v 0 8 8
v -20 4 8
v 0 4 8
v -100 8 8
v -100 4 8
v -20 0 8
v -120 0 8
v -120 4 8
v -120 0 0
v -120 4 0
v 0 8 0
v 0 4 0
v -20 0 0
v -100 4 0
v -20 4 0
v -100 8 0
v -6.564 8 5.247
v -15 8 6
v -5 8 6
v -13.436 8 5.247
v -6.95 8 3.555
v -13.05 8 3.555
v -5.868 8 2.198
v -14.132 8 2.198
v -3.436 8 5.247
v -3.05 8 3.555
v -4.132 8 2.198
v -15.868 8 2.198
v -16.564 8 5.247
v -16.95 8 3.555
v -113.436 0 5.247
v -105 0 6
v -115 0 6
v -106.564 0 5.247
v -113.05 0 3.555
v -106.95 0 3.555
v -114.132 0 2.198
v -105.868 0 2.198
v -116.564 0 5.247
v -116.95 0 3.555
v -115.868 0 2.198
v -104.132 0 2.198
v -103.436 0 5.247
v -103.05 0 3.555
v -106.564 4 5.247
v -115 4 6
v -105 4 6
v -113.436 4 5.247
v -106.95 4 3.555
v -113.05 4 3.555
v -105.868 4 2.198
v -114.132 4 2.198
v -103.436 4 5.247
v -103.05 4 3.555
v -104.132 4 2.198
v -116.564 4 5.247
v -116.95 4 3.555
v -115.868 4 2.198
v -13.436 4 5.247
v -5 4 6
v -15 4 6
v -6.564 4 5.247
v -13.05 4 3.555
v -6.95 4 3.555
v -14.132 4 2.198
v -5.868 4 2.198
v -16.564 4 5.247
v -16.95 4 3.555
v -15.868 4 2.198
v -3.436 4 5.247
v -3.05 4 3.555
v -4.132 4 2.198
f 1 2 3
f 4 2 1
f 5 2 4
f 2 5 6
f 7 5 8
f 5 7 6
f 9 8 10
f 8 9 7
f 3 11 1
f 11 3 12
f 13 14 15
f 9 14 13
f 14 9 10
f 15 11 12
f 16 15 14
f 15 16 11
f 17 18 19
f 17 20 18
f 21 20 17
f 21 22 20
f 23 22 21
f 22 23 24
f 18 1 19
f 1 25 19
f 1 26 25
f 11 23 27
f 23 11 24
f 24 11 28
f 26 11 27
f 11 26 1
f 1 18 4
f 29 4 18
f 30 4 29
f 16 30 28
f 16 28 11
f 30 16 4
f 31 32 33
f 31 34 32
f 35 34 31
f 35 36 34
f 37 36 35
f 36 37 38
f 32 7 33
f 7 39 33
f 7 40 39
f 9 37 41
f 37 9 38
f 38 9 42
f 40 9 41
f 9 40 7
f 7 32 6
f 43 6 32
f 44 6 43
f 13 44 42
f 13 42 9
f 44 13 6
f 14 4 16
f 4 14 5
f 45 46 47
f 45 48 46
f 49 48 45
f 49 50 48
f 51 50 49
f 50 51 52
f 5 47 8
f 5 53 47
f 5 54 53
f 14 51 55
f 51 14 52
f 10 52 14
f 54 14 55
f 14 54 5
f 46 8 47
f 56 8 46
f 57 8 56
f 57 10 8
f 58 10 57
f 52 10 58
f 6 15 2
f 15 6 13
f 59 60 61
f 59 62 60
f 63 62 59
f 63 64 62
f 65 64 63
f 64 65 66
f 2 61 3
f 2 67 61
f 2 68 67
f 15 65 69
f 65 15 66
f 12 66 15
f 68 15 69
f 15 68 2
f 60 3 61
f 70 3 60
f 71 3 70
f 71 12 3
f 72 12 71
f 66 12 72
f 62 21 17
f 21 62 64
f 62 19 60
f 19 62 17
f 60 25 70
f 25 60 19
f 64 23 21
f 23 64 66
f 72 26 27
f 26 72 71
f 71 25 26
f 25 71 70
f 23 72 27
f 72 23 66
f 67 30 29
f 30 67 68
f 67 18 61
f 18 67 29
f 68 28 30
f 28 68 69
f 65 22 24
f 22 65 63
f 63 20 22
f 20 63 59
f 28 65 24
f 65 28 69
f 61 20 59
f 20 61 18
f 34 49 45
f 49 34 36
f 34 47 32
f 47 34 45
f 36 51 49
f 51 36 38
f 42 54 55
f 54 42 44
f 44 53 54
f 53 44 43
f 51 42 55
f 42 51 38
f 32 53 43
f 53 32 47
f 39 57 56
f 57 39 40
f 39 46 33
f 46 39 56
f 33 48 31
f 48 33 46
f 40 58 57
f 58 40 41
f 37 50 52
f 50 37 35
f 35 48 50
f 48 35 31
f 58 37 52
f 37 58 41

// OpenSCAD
SupportAxisHeight           = 140                        ;
SupportWidth                = 200                       ;
AxisRadius                  = 5.5                       ;


AxisSupportThickness        = 8                        ;
AxisSupportWidth            = 8                         ;

cubeSupportLenght           = 80                        ;
cubeSupportScrewPartLength  = 20                        ;
ScrewRadius                 = 2                         ;

A                           = acos(SupportAxisHeight/sqrt((SupportWidth/2)*(SupportWidth/2)+SupportAxisHeight*SupportAxisHeight))   ;
Hypotenuse                  = SupportAxisHeight/cos(A)                                                                              ;
T                           = AxisSupportThickness                                                                                  ;
O                           = ((T/(2*cos(90-A)))-(T/2))*sin(A)                                                                      ;
D                           = (cubeSupportLenght+AxisRadius-cubeSupportScrewPartLength)*cos(A)-O                                    ;
H                           = D/cos(A)                                                                                              ;
L                           = D*tan(A)                                                                                              ;

NodeLenght                  = 15    ;

LengthStrengh               = L*2;
TranslateXStrengh           = D * cos(90 - A);
TranslateYStrengh           = D * cos(A);

FootHeight                  = 15;

A2                          = atan((SupportAxisHeight-D-NodeLenght+AxisSupportThickness/2)/(SupportWidth/2));
BoltThickness               = 100;                        ;
ConnectionLength            = BoltThickness/2+cubeSupportScrewPartLength/2  ;

// $fn                     = 300   ;
// echo("ConnectionLength",ConnectionLength);

module Base1()
{
    difference()
    {
        // axis support fixation structure 1
        translate([(cubeSupportLenght+AxisRadius-cubeSupportScrewPartLength)*cos(-A)-AxisSupportThickness/2*sin(A) , (cubeSupportLenght+AxisRadius-cubeSupportScrewPartLength)*sin(-A)-AxisSupportThickness/2*cos(A) , 0])
        {
            rotate([0 , 0 , -A])
            {
               cube([ Hypotenuse-cubeSupportLenght+cubeSupportScrewPartLength-AxisRadius+10*AxisSupportThickness*cos(A), AxisSupportThickness , AxisSupportWidth]);
            }
        }
        // screw part removal
        translate([(cubeSupportLenght+AxisRadius-cubeSupportScrewPartLength)*cos(-A)-AxisSupportThickness/2*sin(A) , (cubeSupportLenght+AxisRadius-cubeSupportScrewPartLength)*sin(-A)-AxisSupportThickness/2*cos(A), -0.5])   // Screw fixation hole part 1
        {
            rotate([0 , 0 , -A])
            {
                cube([cubeSupportScrewPartLength , AxisSupportThickness/2 , AxisSupportWidth+10]);
            }
        }
        //screw holes
        translate([(cubeSupportLenght+AxisRadius-3/4*cubeSupportScrewPartLength)*cos(-A) , (cubeSupportLenght+AxisRadius-3/4*cubeSupportScrewPartLength)*sin(-A), AxisSupportWidth/2])  // screw hole 1 support 1
        {
            rotate([90 , 0 , -A])
            {
                cylinder(h = AxisSupportThickness+50 , r = ScrewRadius , center = true);
            }
        }
        translate([(cubeSupportLenght+AxisRadius-1/4*cubeSupportScrewPartLength)*cos(-A) , (cubeSupportLenght+AxisRadius-1/4*cubeSupportScrewPartLength)*sin(-A), AxisSupportWidth/2])  // screw hole 2 support 1
        {
            rotate([90 , 0 , -A])
            {
                cylinder(h = AxisSupportThickness+50 , r = ScrewRadius , center = true);
            }
        }
        // plane foot removal
        translate([SupportAxisHeight , -SupportWidth*2 , -0.5])
        {
            cube([ SupportAxisHeight , SupportWidth*2, AxisSupportWidth+1]);
        }
    }
    difference()
    {
        // horizontal base part
        translate([SupportAxisHeight-FootHeight-AxisSupportThickness , -((SupportAxisHeight-FootHeight)*tan(A))+AxisSupportThickness/2/cos(A), 0]) // horizontal strength structure between axis support
        {
            cube([ AxisSupportThickness , (SupportAxisHeight-FootHeight)*tan(A)+cubeSupportScrewPartLength/2-AxisSupportThickness/2/cos(A), AxisSupportWidth]);
        }
        // screw part removal
        translate([SupportAxisHeight-FootHeight-AxisSupportThickness , 0 , AxisSupportWidth/2]) // screw part
        {
            cube([ AxisSupportThickness , cubeSupportScrewPartLength, AxisSupportWidth+1] , center = true);
        }
        //screw holes
        translate([SupportAxisHeight-FootHeight-AxisSupportThickness , -1/4*cubeSupportScrewPartLength, AxisSupportWidth/2])  // screw hole 2 support 1
        {
            rotate([0 , 90 , 0])
            {
                cylinder(h = AxisSupportThickness+50 , r = ScrewRadius , center = true);
            }
        }
        translate([SupportAxisHeight-FootHeight-AxisSupportThickness , 1/4*cubeSupportScrewPartLength, AxisSupportWidth/2])  // screw hole 2 support 1
        {
            rotate([0 , 90 , 0])
            {
                cylinder(h = AxisSupportThickness+50 , r = ScrewRadius , center = true);
            }
        }
    }
    //oblic strenght structure
    difference()
    {
        translate([Hypotenuse*cos(-A)-AxisSupportThickness/2*sin(A) , Hypotenuse*sin(-A)-AxisSupportThickness/2*cos(A), ])
        {
            rotate([0 , 0 , A2])
            {
                cube([ AxisSupportThickness , (AxisSupportThickness/2 + SupportWidth/2)/cos(A2), AxisSupportWidth]);
            }
        }
        // plane foot removal
        translate([SupportAxisHeight , -SupportWidth*2 , -0.5])
        {
            cube([ SupportAxisHeight , SupportWidth*2, AxisSupportWidth+1]);
        }
        // screw hole
        translate([D+NodeLenght-AxisSupportThickness/2 , 0 , 0])
        {
            {
                cylinder(h = AxisSupportThickness+50 , r = ScrewRadius , center = true);
            }
        }
        //assembly thickness removal
        translate([D+AxisSupportThickness/2 , -AxisSupportThickness/2 , AxisSupportWidth*2/3-AxisSupportWidth])
        {
            {
                cube([NodeLenght+1 , AxisSupportThickness+10 , AxisSupportWidth]);
            }
        }
        //removal of the conflicting part with the second base
        translate([D+AxisSupportThickness/2 , -AxisSupportThickness/2+AxisSupportThickness , 0])
        {
            {
                cube([NodeLenght+1 , AxisSupportThickness+10 , AxisSupportWidth]);
            }
        }
        //removal of the conflicting part with axis structure
        translate([AxisSupportThickness/2+0.5  ,-(AxisSupportThickness*10)/2 , -0.5])
        {
            {
                cube([D , AxisSupportThickness*10 , AxisSupportWidth+1]);
            }
        }
    }
    
    difference()
    {
        //assembly part to connect 2 strutures
        translate([SupportAxisHeight-FootHeight-AxisSupportThickness , -((SupportAxisHeight-FootHeight)*tan(A))+AxisSupportThickness/2/cos(A), 0]) // horizontal strength structure between axis support
        {
            // color("red")cube([ AxisSupportThickness , AxisSupportWidth ,ConnectionLength+AxisSupportWidth]);
            cube([ AxisSupportThickness , AxisSupportWidth ,ConnectionLength+AxisSupportWidth]);
        }
        translate([SupportAxisHeight-FootHeight-AxisSupportThickness , -((SupportAxisHeight-FootHeight)*tan(A))+AxisSupportThickness/2/cos(A), ConnectionLength+AxisSupportWidth-cubeSupportScrewPartLength]) // horizontal strength structure between axis support
        {
            cube([ AxisSupportThickness , AxisSupportWidth/2 , cubeSupportScrewPartLength]);
        }
        translate([SupportAxisHeight-FootHeight-AxisSupportThickness/2 , -((SupportAxisHeight-FootHeight)*tan(A))+AxisSupportThickness/2/cos(A), ConnectionLength+AxisSupportWidth-3/4*cubeSupportScrewPartLength]) // horizontal strength structure between axis support
        {
            rotate([90 , 0 , 0])
            {
                cylinder(h = AxisSupportThickness+50 , r = ScrewRadius , center = true);
            }
        }
        translate([SupportAxisHeight-FootHeight-AxisSupportThickness/2 , -((SupportAxisHeight-FootHeight)*tan(A))+AxisSupportThickness/2/cos(A), ConnectionLength+AxisSupportWidth-1/4*cubeSupportScrewPartLength]) // horizontal strength structure between axis support
        {
            rotate([90 , 0 , 0])
            {
                cylinder(h = AxisSupportThickness+50 , r = ScrewRadius , center = true);
            }
        }
    }
}
    
    
    
    
    

module Base2()
{
    difference()
    {
        // axis support fixation structure 1
        translate([(cubeSupportLenght+AxisRadius-cubeSupportScrewPartLength)*cos(A)-AxisSupportThickness/2*sin(-A) , (cubeSupportLenght+AxisRadius-cubeSupportScrewPartLength)*sin(A)-AxisSupportThickness/2*cos(-A) , 0])
        {
            rotate([0 , 0 , A])
            {
               cube([ Hypotenuse-cubeSupportLenght+cubeSupportScrewPartLength-AxisRadius+10*AxisSupportThickness*cos(A), AxisSupportThickness , AxisSupportWidth]);
            }
        }
        // screw part removal
        translate([(cubeSupportLenght+AxisRadius-cubeSupportScrewPartLength)*cos(A) , (cubeSupportLenght+AxisRadius-cubeSupportScrewPartLength)*sin(A), -0.5])
        {
            rotate([0 , 0 , A])
            {
                cube([cubeSupportScrewPartLength , AxisSupportThickness/2 , AxisSupportWidth+1]);
            }
        }
        //screw holes
        translate([(cubeSupportLenght+AxisRadius-3/4*cubeSupportScrewPartLength)*cos(A) , (cubeSupportLenght+AxisRadius-3/4*cubeSupportScrewPartLength)*sin(A), AxisSupportWidth/2])
        {
            rotate([90 , 0 , A])
            {
                cylinder(h = AxisSupportThickness+50 , r = ScrewRadius , center = true);
            }
        }
        translate([(cubeSupportLenght+AxisRadius-1/4*cubeSupportScrewPartLength)*cos(A) , (cubeSupportLenght+AxisRadius-1/4*cubeSupportScrewPartLength)*sin(A), AxisSupportWidth/2])
        {
            rotate([90 , 0 , A])
            {
                cylinder(h = AxisSupportThickness+50 , r = ScrewRadius , center = true);
            }
        }
        // plane foot removal
        translate([SupportAxisHeight , 0 , -0.5])
        {
            cube([ SupportAxisHeight , SupportWidth*2, AxisSupportWidth+1]);
        }
    }
    difference()
    {
        // horizontal base part
        translate([SupportAxisHeight-FootHeight-AxisSupportThickness , -cubeSupportScrewPartLength/2, 0])
        {
            cube([ AxisSupportThickness , (SupportAxisHeight-FootHeight)*tan(A)+cubeSupportScrewPartLength/2-AxisSupportThickness/2/cos(A), AxisSupportWidth]);
        }
        // screw part removal
        translate([SupportAxisHeight-FootHeight , 0 , AxisSupportWidth/2])
        {
            cube([ AxisSupportThickness , cubeSupportScrewPartLength, AxisSupportWidth+1] , center = true);
        }
        //screw holes
        translate([SupportAxisHeight-FootHeight-AxisSupportThickness , -1/4*cubeSupportScrewPartLength, AxisSupportWidth/2])
        {
            rotate([0 , 90 , 0])
            {
                cylinder(h = AxisSupportThickness+50 , r = ScrewRadius , center = true);
            }
        }
        translate([SupportAxisHeight-FootHeight-AxisSupportThickness , 1/4*cubeSupportScrewPartLength, AxisSupportWidth/2])
        {
            rotate([0 , 90 , 0])
            {
                cylinder(h = AxisSupportThickness+50 , r = ScrewRadius , center = true);
            }
        }
    }
    
    difference()
    {
        mirror([0 , 1 , 0])
        {
            difference()
            {
                //oblic strenght structure//removal of the conflicting part with axis structure
                translate([Hypotenuse*cos(-A)-AxisSupportThickness/2*sin(A) , Hypotenuse*sin(-A)-AxisSupportThickness/2*cos(A), ])
                {
                    rotate([0 , 0 , A2])
                    {
                        cube([ AxisSupportThickness , (AxisSupportThickness/2 + SupportWidth/2)/cos(A2), AxisSupportWidth]);
                    }
                }
                // plane foot removal
                translate([SupportAxisHeight , -SupportWidth*2 , -0.5])
                {
                    cube([ SupportAxisHeight , SupportWidth*2, AxisSupportWidth+1]);
                }
                //assembly thickness removal
                translate([D+AxisSupportThickness/2 , -AxisSupportThickness/2 , AxisSupportWidth*1/3])
                {
                    {
                        cube([NodeLenght+1 , AxisSupportThickness+10 , AxisSupportWidth]);
                    }
                }    
            }
        }
        // screw hole
        translate([D+NodeLenght-AxisSupportThickness/2 , 0 , 0])
        {
            {
                cylinder(h = AxisSupportThickness+50 , r = ScrewRadius , center = true);
            }
        }
        //removal of the conflicting part with the first base
        translate([D+AxisSupportThickness/2 , -AxisSupportThickness/2-AxisSupportThickness-10 , -0.5])
        {
            {
                cube([NodeLenght+1 , AxisSupportThickness+10 , AxisSupportWidth]);
            }
        }
        //removal of the conflicting part with axis structure
        translate([AxisSupportThickness/2+0.5 ,-(AxisSupportThickness*10)/2 , -0.5])
        {
            {
                cube([D , AxisSupportThickness*10 , AxisSupportWidth+1]);
            }
        }   
    }
    mirror([0 , 1 , 0])
    {

        difference()
        {
            //assembly part to connect 2 strutures
            translate([SupportAxisHeight-FootHeight-AxisSupportThickness , -((SupportAxisHeight-FootHeight)*tan(A))+AxisSupportThickness/2/cos(A), 0]) // horizontal strength structure between axis support
            {
                // color("red")cube([ AxisSupportThickness , AxisSupportWidth ,ConnectionLength+AxisSupportWidth]);
                cube([ AxisSupportThickness , AxisSupportWidth ,ConnectionLength+AxisSupportWidth]);
            }
            translate([SupportAxisHeight-FootHeight-AxisSupportThickness , -((SupportAxisHeight-FootHeight)*tan(A))+AxisSupportThickness/2/cos(A), ConnectionLength+AxisSupportWidth-cubeSupportScrewPartLength]) // horizontal strength structure between axis support
            {
                cube([ AxisSupportThickness , AxisSupportWidth/2 , cubeSupportScrewPartLength]);
            }
            translate([SupportAxisHeight-FootHeight-AxisSupportThickness/2 , -((SupportAxisHeight-FootHeight)*tan(A))+AxisSupportThickness/2/cos(A), ConnectionLength+AxisSupportWidth-3/4*cubeSupportScrewPartLength]) // horizontal strength structure between axis support
            {
                rotate([90 , 0 , 0])
                {
                    cylinder(h = AxisSupportThickness+50 , r = ScrewRadius , center = true);
                }
            }
            translate([SupportAxisHeight-FootHeight-AxisSupportThickness/2 , -((SupportAxisHeight-FootHeight)*tan(A))+AxisSupportThickness/2/cos(A), ConnectionLength+AxisSupportWidth-1/4*cubeSupportScrewPartLength]) // horizontal strength structure between axis support
            {
                rotate([90 , 0 , 0])
                {
                    cylinder(h = AxisSupportThickness+50 , r = ScrewRadius , center = true);
                }
            }
        }
    }
}

    
module Base3()
{
    difference()
    {
        // axis support fixation structure 1
        translate([(cubeSupportLenght+AxisRadius-cubeSupportScrewPartLength)*cos(-A)-AxisSupportThickness/2*sin(A) , (cubeSupportLenght+AxisRadius-cubeSupportScrewPartLength)*sin(-A)-AxisSupportThickness/2*cos(A) , 0])
        {
            rotate([0 , 0 , -A])
            {
               cube([ Hypotenuse-cubeSupportLenght+cubeSupportScrewPartLength-AxisRadius+10*AxisSupportThickness*cos(A), AxisSupportThickness , AxisSupportWidth]);
            }
        }
        // screw part removal
        translate([(cubeSupportLenght+AxisRadius-cubeSupportScrewPartLength)*cos(-A)-AxisSupportThickness/2*sin(A) , (cubeSupportLenght+AxisRadius-cubeSupportScrewPartLength)*sin(-A)-AxisSupportThickness/2*cos(A), -0.5])   // Screw fixation hole part 1
        {
            rotate([0 , 0 , -A])
            {
                cube([cubeSupportScrewPartLength , AxisSupportThickness/2 , AxisSupportWidth+10]);
            }
        }
        //screw holes
        translate([(cubeSupportLenght+AxisRadius-3/4*cubeSupportScrewPartLength)*cos(-A) , (cubeSupportLenght+AxisRadius-3/4*cubeSupportScrewPartLength)*sin(-A), AxisSupportWidth/2])  // screw hole 1 support 1
        {
            rotate([90 , 0 , -A])
            {
                cylinder(h = AxisSupportThickness+50 , r = ScrewRadius , center = true);
            }
        }
        translate([(cubeSupportLenght+AxisRadius-1/4*cubeSupportScrewPartLength)*cos(-A) , (cubeSupportLenght+AxisRadius-1/4*cubeSupportScrewPartLength)*sin(-A), AxisSupportWidth/2])  // screw hole 2 support 1
        {
            rotate([90 , 0 , -A])
            {
                cylinder(h = AxisSupportThickness+50 , r = ScrewRadius , center = true);
            }
        }
        // plane foot removal
        translate([SupportAxisHeight , -SupportWidth*2 , -0.5])
        {
            cube([ SupportAxisHeight , SupportWidth*2, AxisSupportWidth+1]);
        }
    }
    difference()
    {
        // horizontal base part
        translate([SupportAxisHeight-FootHeight-AxisSupportThickness , -((SupportAxisHeight-FootHeight)*tan(A))+AxisSupportThickness/2/cos(A), 0]) // horizontal strength structure between axis support
        {
            cube([ AxisSupportThickness , (SupportAxisHeight-FootHeight)*tan(A)+cubeSupportScrewPartLength/2-AxisSupportThickness/2/cos(A), AxisSupportWidth]);
        }
        // screw part removal
        translate([SupportAxisHeight-FootHeight-AxisSupportThickness , 0 , AxisSupportWidth/2]) // screw part
        {
            cube([ AxisSupportThickness , cubeSupportScrewPartLength, AxisSupportWidth+1] , center = true);
        }
        //screw holes
        translate([SupportAxisHeight-FootHeight-AxisSupportThickness , -1/4*cubeSupportScrewPartLength, AxisSupportWidth/2])  // screw hole 2 support 1
        {
            rotate([0 , 90 , 0])
            {
                cylinder(h = AxisSupportThickness+50 , r = ScrewRadius , center = true);
            }
        }
        translate([SupportAxisHeight-FootHeight-AxisSupportThickness , 1/4*cubeSupportScrewPartLength, AxisSupportWidth/2])  // screw hole 2 support 1
        {
            rotate([0 , 90 , 0])
            {
                cylinder(h = AxisSupportThickness+50 , r = ScrewRadius , center = true);
            }
        }
    }
    //oblic strenght structure
    difference()
    {
        translate([Hypotenuse*cos(-A)-AxisSupportThickness/2*sin(A) , Hypotenuse*sin(-A)-AxisSupportThickness/2*cos(A), ])
        {
            rotate([0 , 0 , A2])
            {
                cube([ AxisSupportThickness , (AxisSupportThickness/2 + SupportWidth/2)/cos(A2), AxisSupportWidth]);
            }
        }
        // plane foot removal
        translate([SupportAxisHeight , -SupportWidth*2 , -0.5])
        {
            cube([ SupportAxisHeight , SupportWidth*2, AxisSupportWidth+1]);
        }
        // screw hole
        translate([D+NodeLenght-AxisSupportThickness/2 , 0 , 0])
        {
            {
                cylinder(h = AxisSupportThickness+50 , r = ScrewRadius , center = true);
            }
        }
        //assembly thickness removal
        translate([D+AxisSupportThickness/2 , -AxisSupportThickness/2 , AxisSupportWidth*2/3-AxisSupportWidth])
        {
            {
                cube([NodeLenght+1 , AxisSupportThickness+10 , AxisSupportWidth]);
            }
        }
        //removal of the conflicting part with the second base
        translate([D+AxisSupportThickness/2 , -AxisSupportThickness/2+AxisSupportThickness , 0])
        {
            {
                cube([NodeLenght+1 , AxisSupportThickness+10 , AxisSupportWidth]);
            }
        }
        //removal of the conflicting part with axis structure
        translate([AxisSupportThickness/2+0.5  ,-(AxisSupportThickness*10)/2 , -0.5])
        {
            {
                cube([D , AxisSupportThickness*10 , AxisSupportWidth+1]);
            }
        }
    }
    
    difference()
    {
        //assembly part to connect 2 strutures
        translate([SupportAxisHeight-FootHeight-AxisSupportThickness , -((SupportAxisHeight-FootHeight)*tan(A))+AxisSupportThickness/2/cos(A), 0]) // horizontal strength structure between axis support
        {
            cube([ AxisSupportThickness , AxisSupportWidth ,ConnectionLength+AxisSupportWidth]);
        }
        translate([SupportAxisHeight-FootHeight-AxisSupportThickness , -((SupportAxisHeight-FootHeight)*tan(A))+AxisSupportThickness/2/cos(A)+AxisSupportWidth/2, ConnectionLength+AxisSupportWidth-cubeSupportScrewPartLength]) // horizontal strength structure between axis support
        {
            cube([ AxisSupportThickness , AxisSupportWidth/2 , cubeSupportScrewPartLength]);
        }
        translate([SupportAxisHeight-FootHeight-AxisSupportThickness/2 , -((SupportAxisHeight-FootHeight)*tan(A))+AxisSupportThickness/2/cos(A), ConnectionLength+AxisSupportWidth-3/4*cubeSupportScrewPartLength]) // horizontal strength structure between axis support
        {
            rotate([90 , 0 , 0])
            {
                cylinder(h = AxisSupportThickness+50 , r = ScrewRadius , center = true);
            }
        }
        translate([SupportAxisHeight-FootHeight-AxisSupportThickness/2 , -((SupportAxisHeight-FootHeight)*tan(A))+AxisSupportThickness/2/cos(A), ConnectionLength+AxisSupportWidth-1/4*cubeSupportScrewPartLength]) // horizontal strength structure between axis support
        {
            rotate([90 , 0 , 0])
            {
                cylinder(h = AxisSupportThickness+50 , r = ScrewRadius , center = true);
            }
        }
    }
}
    
    
    
    
module Base4()
{
    difference()
    {
        // axis support fixation structure 1
        translate([(cubeSupportLenght+AxisRadius-cubeSupportScrewPartLength)*cos(A)-AxisSupportThickness/2*sin(-A) , (cubeSupportLenght+AxisRadius-cubeSupportScrewPartLength)*sin(A)-AxisSupportThickness/2*cos(-A) , 0])
        {
            rotate([0 , 0 , A])
            {
               cube([ Hypotenuse-cubeSupportLenght+cubeSupportScrewPartLength-AxisRadius+10*AxisSupportThickness*cos(A), AxisSupportThickness , AxisSupportWidth]);
            }
        }
        // screw part removal
        translate([(cubeSupportLenght+AxisRadius-cubeSupportScrewPartLength)*cos(A) , (cubeSupportLenght+AxisRadius-cubeSupportScrewPartLength)*sin(A), -0.5])
        {
            rotate([0 , 0 , A])
            {
                cube([cubeSupportScrewPartLength , AxisSupportThickness/2 , AxisSupportWidth+1]);
            }
        }
        //screw holes
        translate([(cubeSupportLenght+AxisRadius-3/4*cubeSupportScrewPartLength)*cos(A) , (cubeSupportLenght+AxisRadius-3/4*cubeSupportScrewPartLength)*sin(A), AxisSupportWidth/2])
        {
            rotate([90 , 0 , A])
            {
                cylinder(h = AxisSupportThickness+50 , r = ScrewRadius , center = true);
            }
        }
        translate([(cubeSupportLenght+AxisRadius-1/4*cubeSupportScrewPartLength)*cos(A) , (cubeSupportLenght+AxisRadius-1/4*cubeSupportScrewPartLength)*sin(A), AxisSupportWidth/2])
        {
            rotate([90 , 0 , A])
            {
                cylinder(h = AxisSupportThickness+50 , r = ScrewRadius , center = true);
            }
        }
        // plane foot removal
        translate([SupportAxisHeight , 0 , -0.5])
        {
            cube([ SupportAxisHeight , SupportWidth*2, AxisSupportWidth+1]);
        }
    }
    difference()
    {
        // horizontal base part
        translate([SupportAxisHeight-FootHeight-AxisSupportThickness , -cubeSupportScrewPartLength/2, 0])
        {
            cube([ AxisSupportThickness , (SupportAxisHeight-FootHeight)*tan(A)+cubeSupportScrewPartLength/2-AxisSupportThickness/2/cos(A), AxisSupportWidth]);
        }
        // screw part removal
        translate([SupportAxisHeight-FootHeight , 0 , AxisSupportWidth/2])
        {
            cube([ AxisSupportThickness , cubeSupportScrewPartLength, AxisSupportWidth+1] , center = true);
        }
        //screw holes
        translate([SupportAxisHeight-FootHeight-AxisSupportThickness , -1/4*cubeSupportScrewPartLength, AxisSupportWidth/2])
        {
            rotate([0 , 90 , 0])
            {
                cylinder(h = AxisSupportThickness+50 , r = ScrewRadius , center = true);
            }
        }
        translate([SupportAxisHeight-FootHeight-AxisSupportThickness , 1/4*cubeSupportScrewPartLength, AxisSupportWidth/2])
        {
            rotate([0 , 90 , 0])
            {
                cylinder(h = AxisSupportThickness+50 , r = ScrewRadius , center = true);
            }
        }
    }
    
    difference()
    {
        mirror([0 , 1 , 0])
        {
            difference()
            {
                //oblic strenght structure//removal of the conflicting part with axis structure
                translate([Hypotenuse*cos(-A)-AxisSupportThickness/2*sin(A) , Hypotenuse*sin(-A)-AxisSupportThickness/2*cos(A), ])
                {
                    rotate([0 , 0 , A2])
                    {
                        cube([ AxisSupportThickness , (AxisSupportThickness/2 + SupportWidth/2)/cos(A2), AxisSupportWidth]);
                    }
                }
                // plane foot removal
                translate([SupportAxisHeight , -SupportWidth*2 , -0.5])
                {
                    cube([ SupportAxisHeight , SupportWidth*2, AxisSupportWidth+1]);
                }
                //assembly thickness removal
                translate([D+AxisSupportThickness/2 , -AxisSupportThickness/2 , AxisSupportWidth*1/3])
                {
                    {
                        cube([NodeLenght+1 , AxisSupportThickness+10 , AxisSupportWidth]);
                    }
                }    
            }
        }
        // screw hole
        translate([D+NodeLenght-AxisSupportThickness/2 , 0 , 0])
        {
            {
                cylinder(h = AxisSupportThickness+50 , r = ScrewRadius , center = true);
            }
        }
        //removal of the conflicting part with the first base
        translate([D+AxisSupportThickness/2 , -AxisSupportThickness/2-AxisSupportThickness-10 , -0.5])
        {
            {
                cube([NodeLenght+1 , AxisSupportThickness+10 , AxisSupportWidth]);
            }
        }
        //removal of the conflicting part with axis structure
        translate([AxisSupportThickness/2+0.5 ,-(AxisSupportThickness*10)/2 , -0.5])
        {
            {
                cube([D , AxisSupportThickness*10 , AxisSupportWidth+1]);
            }
        }   
    }
    mirror([0 , 1 , 0])
    {

        difference()
        {
            //assembly part to connect 2 strutures
            translate([SupportAxisHeight-FootHeight-AxisSupportThickness , -((SupportAxisHeight-FootHeight)*tan(A))+AxisSupportThickness/2/cos(A), 0]) // horizontal strength structure between axis support
            {
                // color("red")cube([ AxisSupportThickness , AxisSupportWidth ,ConnectionLength+AxisSupportWidth]);
                cube([ AxisSupportThickness , AxisSupportWidth ,ConnectionLength+AxisSupportWidth]);
            }
            translate([SupportAxisHeight-FootHeight-AxisSupportThickness , -((SupportAxisHeight-FootHeight)*tan(A))+AxisSupportThickness/2/cos(A)+AxisSupportWidth/2, ConnectionLength+AxisSupportWidth-cubeSupportScrewPartLength]) // horizontal strength structure between axis support
            {
                cube([ AxisSupportThickness , AxisSupportWidth/2 , cubeSupportScrewPartLength]);
            }
            translate([SupportAxisHeight-FootHeight-AxisSupportThickness/2 , -((SupportAxisHeight-FootHeight)*tan(A))+AxisSupportThickness/2/cos(A), ConnectionLength+AxisSupportWidth-3/4*cubeSupportScrewPartLength]) // horizontal strength structure between axis support
            {
                rotate([90 , 0 , 0])
                {
                    cylinder(h = AxisSupportThickness+50 , r = ScrewRadius , center = true);
                }
            }
            translate([SupportAxisHeight-FootHeight-AxisSupportThickness/2 , -((SupportAxisHeight-FootHeight)*tan(A))+AxisSupportThickness/2/cos(A), ConnectionLength+AxisSupportWidth-1/4*cubeSupportScrewPartLength]) // horizontal strength structure between axis support
            {
                rotate([90 , 0 , 0])
                {
                    cylinder(h = AxisSupportThickness+50 , r = ScrewRadius , center = true);
                }
            }
        }
    }
}

    
    
    
    
    
    
    
module ThreeBoltSupportConnection()
{
    rotate([0 , -90 , 0])
    {
        difference()
        {
            cube([ AxisSupportThickness , AxisSupportWidth , cubeSupportScrewPartLength+BoltThickness]);
            
            translate([0 , AxisSupportWidth/2, BoltThickness])
            {
                cube([ AxisSupportThickness , AxisSupportWidth/2 , cubeSupportScrewPartLength]);
            }
            cube([ AxisSupportThickness , AxisSupportWidth/2 , cubeSupportScrewPartLength]);
            
            translate([AxisSupportThickness/2 , 0 , 1/4*cubeSupportScrewPartLength])
            {
                rotate([90 , 0 , 0])
                {
                    cylinder(h = AxisSupportThickness+50 , r = ScrewRadius , center = true);
                }
            }
            translate([AxisSupportThickness/2 , 0 , 3/4*cubeSupportScrewPartLength])
            {
                rotate([90 , 0 , 0])
                {
                    cylinder(h = AxisSupportThickness+50 , r = ScrewRadius , center = true);
                }
            }
            
            translate([AxisSupportThickness/2 , 0 , BoltThickness+1/4*cubeSupportScrewPartLength])
            {
                rotate([90 , 0 , 0])
                {
                    cylinder(h = AxisSupportThickness+50 , r = ScrewRadius , center = true);
                }
            }
            translate([AxisSupportThickness/2 , 0 , BoltThickness+3/4*cubeSupportScrewPartLength])
            {
                rotate([90 , 0 , 0])
                {
                    cylinder(h = AxisSupportThickness+50 , r = ScrewRadius , center = true);
                }
            }
        }
    }
}
    
    
    
    
    
    
    
    
    
    
module AxisSupport()
{
    difference()    // axis support
    {
        union()
        {
            cylinder(h = AxisSupportWidth , r = AxisSupportThickness+AxisRadius);
            difference()
            {
                // axis support fixation structure 2
                rotate([0 , 0 , -A])   
                {
                    translate([0 , -AxisSupportThickness/2 , 0])
                    {
                        cube([ cubeSupportLenght+AxisRadius, AxisSupportThickness , AxisSupportWidth]);
                    }
                    
                }
                // screw holes
                translate([(cubeSupportLenght+AxisRadius-3/4*cubeSupportScrewPartLength)*cos(-A) , (cubeSupportLenght+AxisRadius-3/4*cubeSupportScrewPartLength)*sin(-A), AxisSupportWidth/2])  // screw hole 1 support 1
                {
                    rotate([90 , 0 , -A])
                    {
                        cylinder(h = AxisSupportThickness+50 , r = ScrewRadius , center = true);
                    }
                }
                translate([(cubeSupportLenght+AxisRadius-1/4*cubeSupportScrewPartLength)*cos(-A) , (cubeSupportLenght+AxisRadius-1/4*cubeSupportScrewPartLength)*sin(-A), AxisSupportWidth/2])  // screw hole 2 support 1
                {
                    rotate([90 , 0 , -A])
                    {
                        cylinder(h = AxisSupportThickness+50 , r = ScrewRadius , center = true);
                    }
                }
            }
            difference()
            {
                // axis support fixation structure 2
                rotate([0 , 0 , A])
                {

                    translate([0 , -AxisSupportThickness/2 , 0])
                    {
                        cube([ cubeSupportLenght+AxisRadius , AxisSupportThickness , AxisSupportWidth]);
                    }
                }
                // screw holes
                translate([(cubeSupportLenght+AxisRadius-3/4*cubeSupportScrewPartLength)*cos(A) , (cubeSupportLenght+AxisRadius-3/4*cubeSupportScrewPartLength)*sin(A), AxisSupportWidth/2])  // screw hole 1 support 1
                {
                    rotate([90 , 0 , A])
                    {
                        cylinder(h = AxisSupportThickness+50 , r = ScrewRadius , center = true);
                    }
                }
                translate([(cubeSupportLenght+AxisRadius-1/4*cubeSupportScrewPartLength)*cos(A) , (cubeSupportLenght+AxisRadius-1/4*cubeSupportScrewPartLength)*sin(A), AxisSupportWidth/2])  // screw hole 2 support 1
                {
                    rotate([90 , 0 , A])
                    {
                        cylinder(h = AxisSupportThickness+50 , r = ScrewRadius , center = true);
                    }
                }
            }
            // horizontal strength structure between axis support
            translate([D , 0 , AxisSupportWidth/2]) 
            {
                {
                    cube([ AxisSupportThickness, LengthStrengh , AxisSupportWidth] , center = true);
                }
            }
            // vertical strength structure between axis support
            translate([0 , AxisSupportThickness/2 , 0])
            {
                rotate([0 , 0 , -90])
                {
                    cube([ AxisSupportThickness, D+NodeLenght , AxisSupportWidth]);
                }
            }
            // oblic strength structure between axis support 1
            translate([(cubeSupportLenght+AxisRadius-cubeSupportScrewPartLength)/2*cos(-A) , (cubeSupportLenght+AxisRadius-cubeSupportScrewPartLength)/2*sin(-A) , 0])
            {
                rotate([0 , 0 , A])
                {
                    cube([(cubeSupportLenght+AxisRadius-cubeSupportScrewPartLength)/2 , AxisSupportThickness , AxisSupportWidth]);
                }
            }
            // oblic strength structure between axis support 1
            mirror([0,1,0])
            {
                translate([(cubeSupportLenght+AxisRadius-cubeSupportScrewPartLength)/2*cos(-A) , (cubeSupportLenght+AxisRadius-cubeSupportScrewPartLength)/2*sin(-A) , 0])
                {
                    rotate([0 , 0 , A])
                    {
                        cube([(cubeSupportLenght+AxisRadius-cubeSupportScrewPartLength)/2 , AxisSupportThickness , AxisSupportWidth]);
                    }
                }
            }
        }
        // Axis Hole
        translate([0 , 0 , -0.5])   
        {
            cylinder(h = AxisSupportWidth+1 , r = AxisRadius);
        }
        // Screw fixation hole part 1
        rotate([0 , 0 , -A])
        {
            translate([cubeSupportLenght+AxisRadius-cubeSupportScrewPartLength , 0 , -0.5])
            {
                cube([cubeSupportScrewPartLength , AxisSupportThickness/2 , AxisSupportWidth+1]);
            }
        }
        // Screw fixation hole part 2
        rotate([0 , 0 , A])
        {
            translate([cubeSupportLenght+AxisRadius-cubeSupportScrewPartLength , -AxisSupportThickness/2 , -0.5])
            {
                cube([cubeSupportScrewPartLength , AxisSupportThickness/2 , AxisSupportWidth+1]);
            }
        }
        //screw hole for oblic base structure assembly
        translate([D+NodeLenght-AxisSupportThickness/2 , 0 , 0])
        {
            {
                cylinder(h = AxisSupportThickness+50 , r = ScrewRadius , center = true);
            }
        }
        //thickness assembly removals
        translate([D+AxisSupportThickness/2 , -AxisSupportThickness/2-0.5 , AxisSupportWidth*2/3])   // Axis Hole
        {
            {
                cube([NodeLenght+1 , AxisSupportThickness+1 , AxisSupportWidth]);
            }
        }
        translate([D+AxisSupportThickness/2 , -AxisSupportThickness/2-0.5 , -AxisSupportWidth+AxisSupportWidth*1/3])   // Axis Hole
        {
            {
                cube([NodeLenght+1 , AxisSupportThickness+1 , AxisSupportWidth]);
            }
        }
    }
}

module AssembledView()
{
    translate([0 , 0 , BoltThickness*2+2*AxisSupportWidth+2 ])
    {   
        rotate([180 , 0 , 0])
        {   
            color("DarkOrchid")AxisSupport();
        }
    }

    translate([0 , 0 , BoltThickness*2+2*AxisSupportWidth+2 ])
    {   
        rotate([180 , 0 , 0])
        {   
            color("MediumPurple")Base1();
        }
    }

    translate([0 , 0 , BoltThickness*2+2*AxisSupportWidth+2])
    {   
        rotate([180 , 0 , 0])
        {   
            color("MediumSlateBlue")Base2();
        }
    }

    translate([0 , 0 , 0 ])
    {   
        color("MediumSpringGreen")AxisSupport();
    }

    translate([0 , 0 , 0 ])
    {   
        color("PaleGreen")Base3();
    }

    translate([0 , 0 , 0 ])
    {   
        color("DarkCyan")Base4();
    }

    translate([SupportAxisHeight-FootHeight-AxisSupportThickness , -((SupportAxisHeight-FootHeight)*tan(A))+AxisSupportThickness/2/cos(A) , ConnectionLength+AxisSupportWidth-cubeSupportScrewPartLength+1])
    {
        rotate([0 , 90 , 0])
        {
            color("Crimson")ThreeBoltSupportConnection();
        }
    }
    mirror([0 , 1 , 0])
    {
        translate([SupportAxisHeight-FootHeight-AxisSupportThickness , -((SupportAxisHeight-FootHeight)*tan(A))+AxisSupportThickness/2/cos(A) , ConnectionLength+AxisSupportWidth-cubeSupportScrewPartLength+1])
        {
            rotate([0 , 90 , 0])
            {
                color("Salmon")ThreeBoltSupportConnection();
            }
        }
    }
}


module SplitView()
{
    translate([-50 , 25 , BoltThickness*2+2*AxisSupportWidth+2+2*cubeSupportScrewPartLength ])
    {   
        rotate([180 , 0 , 0])
        {   
            AxisSupport();
        }
    }

    translate([0 , 50 , BoltThickness*2+2*AxisSupportWidth+2+2*cubeSupportScrewPartLength ])
    {   
        rotate([180 , 0 , 0])
        {   
            Base1();
        }
    }

    translate([0 , 0 , BoltThickness*2+2*AxisSupportWidth+2+2*cubeSupportScrewPartLength ])
    {   
        rotate([180 , 0 , 0])
        {   
            Base2();
        }
    }

    translate([-50 , 25 , 0 ])
    {   
        AxisSupport();
    }

    Base3();

    translate([0 , 50 , 0 ])
    {   
        Base4();
    }

    translate([SupportAxisHeight-FootHeight-AxisSupportThickness , -((SupportAxisHeight-FootHeight)*tan(A))+AxisSupportThickness/2/cos(A) , ConnectionLength+AxisSupportWidth-cubeSupportScrewPartLength+1+cubeSupportScrewPartLength])
    {
        rotate([0 , 90 , 0])
        {
            ThreeBoltSupportConnection();
        }
    }
    mirror([0 , 1 , 0])
    {
        translate([SupportAxisHeight-FootHeight-AxisSupportThickness , -((SupportAxisHeight-FootHeight)*tan(A))+AxisSupportThickness/2/cos(A)-50 , ConnectionLength+AxisSupportWidth-cubeSupportScrewPartLength+1+cubeSupportScrewPartLength ])
        {
            rotate([0 , 90 , 0])
            {
                ThreeBoltSupportConnection();
            }
        }
    }
}

module PlaneView()
{
    translate([-SupportAxisHeight/2 , 0 , 0 ])
    {
        AxisSupport();
    }
    translate([-SupportAxisHeight/2-D , -SupportWidth/2 , 0 ])
    {
        Base1();
    }
    translate([-SupportAxisHeight/2-D , SupportWidth/2 , 0 ])
    {
        Base2();
    }
    
    translate([SupportAxisHeight/2 , 0 , 0 ])
    {
        AxisSupport();
    }
    translate([SupportAxisHeight/2-D , -SupportWidth/2 , 0 ])
    {
        Base3();
    }
    translate([SupportAxisHeight/2-D , SupportWidth/2 , 0 ])
    {
        Base4();
    }
    
    translate([100 , SupportWidth/3 , 0 ])
    {
        ThreeBoltSupportConnection();
    }
    translate([100 , -SupportWidth/3 , 0 ])
    {
        ThreeBoltSupportConnection();
    }
}

module PrintView()
{
    // AxisSupport();
    // Base1();
    // Base2();
    // Base3();
    // Base4();
    ThreeBoltSupportConnection();
}




// AssembledView();
// SplitView();
// PlaneView();
PrintView();
